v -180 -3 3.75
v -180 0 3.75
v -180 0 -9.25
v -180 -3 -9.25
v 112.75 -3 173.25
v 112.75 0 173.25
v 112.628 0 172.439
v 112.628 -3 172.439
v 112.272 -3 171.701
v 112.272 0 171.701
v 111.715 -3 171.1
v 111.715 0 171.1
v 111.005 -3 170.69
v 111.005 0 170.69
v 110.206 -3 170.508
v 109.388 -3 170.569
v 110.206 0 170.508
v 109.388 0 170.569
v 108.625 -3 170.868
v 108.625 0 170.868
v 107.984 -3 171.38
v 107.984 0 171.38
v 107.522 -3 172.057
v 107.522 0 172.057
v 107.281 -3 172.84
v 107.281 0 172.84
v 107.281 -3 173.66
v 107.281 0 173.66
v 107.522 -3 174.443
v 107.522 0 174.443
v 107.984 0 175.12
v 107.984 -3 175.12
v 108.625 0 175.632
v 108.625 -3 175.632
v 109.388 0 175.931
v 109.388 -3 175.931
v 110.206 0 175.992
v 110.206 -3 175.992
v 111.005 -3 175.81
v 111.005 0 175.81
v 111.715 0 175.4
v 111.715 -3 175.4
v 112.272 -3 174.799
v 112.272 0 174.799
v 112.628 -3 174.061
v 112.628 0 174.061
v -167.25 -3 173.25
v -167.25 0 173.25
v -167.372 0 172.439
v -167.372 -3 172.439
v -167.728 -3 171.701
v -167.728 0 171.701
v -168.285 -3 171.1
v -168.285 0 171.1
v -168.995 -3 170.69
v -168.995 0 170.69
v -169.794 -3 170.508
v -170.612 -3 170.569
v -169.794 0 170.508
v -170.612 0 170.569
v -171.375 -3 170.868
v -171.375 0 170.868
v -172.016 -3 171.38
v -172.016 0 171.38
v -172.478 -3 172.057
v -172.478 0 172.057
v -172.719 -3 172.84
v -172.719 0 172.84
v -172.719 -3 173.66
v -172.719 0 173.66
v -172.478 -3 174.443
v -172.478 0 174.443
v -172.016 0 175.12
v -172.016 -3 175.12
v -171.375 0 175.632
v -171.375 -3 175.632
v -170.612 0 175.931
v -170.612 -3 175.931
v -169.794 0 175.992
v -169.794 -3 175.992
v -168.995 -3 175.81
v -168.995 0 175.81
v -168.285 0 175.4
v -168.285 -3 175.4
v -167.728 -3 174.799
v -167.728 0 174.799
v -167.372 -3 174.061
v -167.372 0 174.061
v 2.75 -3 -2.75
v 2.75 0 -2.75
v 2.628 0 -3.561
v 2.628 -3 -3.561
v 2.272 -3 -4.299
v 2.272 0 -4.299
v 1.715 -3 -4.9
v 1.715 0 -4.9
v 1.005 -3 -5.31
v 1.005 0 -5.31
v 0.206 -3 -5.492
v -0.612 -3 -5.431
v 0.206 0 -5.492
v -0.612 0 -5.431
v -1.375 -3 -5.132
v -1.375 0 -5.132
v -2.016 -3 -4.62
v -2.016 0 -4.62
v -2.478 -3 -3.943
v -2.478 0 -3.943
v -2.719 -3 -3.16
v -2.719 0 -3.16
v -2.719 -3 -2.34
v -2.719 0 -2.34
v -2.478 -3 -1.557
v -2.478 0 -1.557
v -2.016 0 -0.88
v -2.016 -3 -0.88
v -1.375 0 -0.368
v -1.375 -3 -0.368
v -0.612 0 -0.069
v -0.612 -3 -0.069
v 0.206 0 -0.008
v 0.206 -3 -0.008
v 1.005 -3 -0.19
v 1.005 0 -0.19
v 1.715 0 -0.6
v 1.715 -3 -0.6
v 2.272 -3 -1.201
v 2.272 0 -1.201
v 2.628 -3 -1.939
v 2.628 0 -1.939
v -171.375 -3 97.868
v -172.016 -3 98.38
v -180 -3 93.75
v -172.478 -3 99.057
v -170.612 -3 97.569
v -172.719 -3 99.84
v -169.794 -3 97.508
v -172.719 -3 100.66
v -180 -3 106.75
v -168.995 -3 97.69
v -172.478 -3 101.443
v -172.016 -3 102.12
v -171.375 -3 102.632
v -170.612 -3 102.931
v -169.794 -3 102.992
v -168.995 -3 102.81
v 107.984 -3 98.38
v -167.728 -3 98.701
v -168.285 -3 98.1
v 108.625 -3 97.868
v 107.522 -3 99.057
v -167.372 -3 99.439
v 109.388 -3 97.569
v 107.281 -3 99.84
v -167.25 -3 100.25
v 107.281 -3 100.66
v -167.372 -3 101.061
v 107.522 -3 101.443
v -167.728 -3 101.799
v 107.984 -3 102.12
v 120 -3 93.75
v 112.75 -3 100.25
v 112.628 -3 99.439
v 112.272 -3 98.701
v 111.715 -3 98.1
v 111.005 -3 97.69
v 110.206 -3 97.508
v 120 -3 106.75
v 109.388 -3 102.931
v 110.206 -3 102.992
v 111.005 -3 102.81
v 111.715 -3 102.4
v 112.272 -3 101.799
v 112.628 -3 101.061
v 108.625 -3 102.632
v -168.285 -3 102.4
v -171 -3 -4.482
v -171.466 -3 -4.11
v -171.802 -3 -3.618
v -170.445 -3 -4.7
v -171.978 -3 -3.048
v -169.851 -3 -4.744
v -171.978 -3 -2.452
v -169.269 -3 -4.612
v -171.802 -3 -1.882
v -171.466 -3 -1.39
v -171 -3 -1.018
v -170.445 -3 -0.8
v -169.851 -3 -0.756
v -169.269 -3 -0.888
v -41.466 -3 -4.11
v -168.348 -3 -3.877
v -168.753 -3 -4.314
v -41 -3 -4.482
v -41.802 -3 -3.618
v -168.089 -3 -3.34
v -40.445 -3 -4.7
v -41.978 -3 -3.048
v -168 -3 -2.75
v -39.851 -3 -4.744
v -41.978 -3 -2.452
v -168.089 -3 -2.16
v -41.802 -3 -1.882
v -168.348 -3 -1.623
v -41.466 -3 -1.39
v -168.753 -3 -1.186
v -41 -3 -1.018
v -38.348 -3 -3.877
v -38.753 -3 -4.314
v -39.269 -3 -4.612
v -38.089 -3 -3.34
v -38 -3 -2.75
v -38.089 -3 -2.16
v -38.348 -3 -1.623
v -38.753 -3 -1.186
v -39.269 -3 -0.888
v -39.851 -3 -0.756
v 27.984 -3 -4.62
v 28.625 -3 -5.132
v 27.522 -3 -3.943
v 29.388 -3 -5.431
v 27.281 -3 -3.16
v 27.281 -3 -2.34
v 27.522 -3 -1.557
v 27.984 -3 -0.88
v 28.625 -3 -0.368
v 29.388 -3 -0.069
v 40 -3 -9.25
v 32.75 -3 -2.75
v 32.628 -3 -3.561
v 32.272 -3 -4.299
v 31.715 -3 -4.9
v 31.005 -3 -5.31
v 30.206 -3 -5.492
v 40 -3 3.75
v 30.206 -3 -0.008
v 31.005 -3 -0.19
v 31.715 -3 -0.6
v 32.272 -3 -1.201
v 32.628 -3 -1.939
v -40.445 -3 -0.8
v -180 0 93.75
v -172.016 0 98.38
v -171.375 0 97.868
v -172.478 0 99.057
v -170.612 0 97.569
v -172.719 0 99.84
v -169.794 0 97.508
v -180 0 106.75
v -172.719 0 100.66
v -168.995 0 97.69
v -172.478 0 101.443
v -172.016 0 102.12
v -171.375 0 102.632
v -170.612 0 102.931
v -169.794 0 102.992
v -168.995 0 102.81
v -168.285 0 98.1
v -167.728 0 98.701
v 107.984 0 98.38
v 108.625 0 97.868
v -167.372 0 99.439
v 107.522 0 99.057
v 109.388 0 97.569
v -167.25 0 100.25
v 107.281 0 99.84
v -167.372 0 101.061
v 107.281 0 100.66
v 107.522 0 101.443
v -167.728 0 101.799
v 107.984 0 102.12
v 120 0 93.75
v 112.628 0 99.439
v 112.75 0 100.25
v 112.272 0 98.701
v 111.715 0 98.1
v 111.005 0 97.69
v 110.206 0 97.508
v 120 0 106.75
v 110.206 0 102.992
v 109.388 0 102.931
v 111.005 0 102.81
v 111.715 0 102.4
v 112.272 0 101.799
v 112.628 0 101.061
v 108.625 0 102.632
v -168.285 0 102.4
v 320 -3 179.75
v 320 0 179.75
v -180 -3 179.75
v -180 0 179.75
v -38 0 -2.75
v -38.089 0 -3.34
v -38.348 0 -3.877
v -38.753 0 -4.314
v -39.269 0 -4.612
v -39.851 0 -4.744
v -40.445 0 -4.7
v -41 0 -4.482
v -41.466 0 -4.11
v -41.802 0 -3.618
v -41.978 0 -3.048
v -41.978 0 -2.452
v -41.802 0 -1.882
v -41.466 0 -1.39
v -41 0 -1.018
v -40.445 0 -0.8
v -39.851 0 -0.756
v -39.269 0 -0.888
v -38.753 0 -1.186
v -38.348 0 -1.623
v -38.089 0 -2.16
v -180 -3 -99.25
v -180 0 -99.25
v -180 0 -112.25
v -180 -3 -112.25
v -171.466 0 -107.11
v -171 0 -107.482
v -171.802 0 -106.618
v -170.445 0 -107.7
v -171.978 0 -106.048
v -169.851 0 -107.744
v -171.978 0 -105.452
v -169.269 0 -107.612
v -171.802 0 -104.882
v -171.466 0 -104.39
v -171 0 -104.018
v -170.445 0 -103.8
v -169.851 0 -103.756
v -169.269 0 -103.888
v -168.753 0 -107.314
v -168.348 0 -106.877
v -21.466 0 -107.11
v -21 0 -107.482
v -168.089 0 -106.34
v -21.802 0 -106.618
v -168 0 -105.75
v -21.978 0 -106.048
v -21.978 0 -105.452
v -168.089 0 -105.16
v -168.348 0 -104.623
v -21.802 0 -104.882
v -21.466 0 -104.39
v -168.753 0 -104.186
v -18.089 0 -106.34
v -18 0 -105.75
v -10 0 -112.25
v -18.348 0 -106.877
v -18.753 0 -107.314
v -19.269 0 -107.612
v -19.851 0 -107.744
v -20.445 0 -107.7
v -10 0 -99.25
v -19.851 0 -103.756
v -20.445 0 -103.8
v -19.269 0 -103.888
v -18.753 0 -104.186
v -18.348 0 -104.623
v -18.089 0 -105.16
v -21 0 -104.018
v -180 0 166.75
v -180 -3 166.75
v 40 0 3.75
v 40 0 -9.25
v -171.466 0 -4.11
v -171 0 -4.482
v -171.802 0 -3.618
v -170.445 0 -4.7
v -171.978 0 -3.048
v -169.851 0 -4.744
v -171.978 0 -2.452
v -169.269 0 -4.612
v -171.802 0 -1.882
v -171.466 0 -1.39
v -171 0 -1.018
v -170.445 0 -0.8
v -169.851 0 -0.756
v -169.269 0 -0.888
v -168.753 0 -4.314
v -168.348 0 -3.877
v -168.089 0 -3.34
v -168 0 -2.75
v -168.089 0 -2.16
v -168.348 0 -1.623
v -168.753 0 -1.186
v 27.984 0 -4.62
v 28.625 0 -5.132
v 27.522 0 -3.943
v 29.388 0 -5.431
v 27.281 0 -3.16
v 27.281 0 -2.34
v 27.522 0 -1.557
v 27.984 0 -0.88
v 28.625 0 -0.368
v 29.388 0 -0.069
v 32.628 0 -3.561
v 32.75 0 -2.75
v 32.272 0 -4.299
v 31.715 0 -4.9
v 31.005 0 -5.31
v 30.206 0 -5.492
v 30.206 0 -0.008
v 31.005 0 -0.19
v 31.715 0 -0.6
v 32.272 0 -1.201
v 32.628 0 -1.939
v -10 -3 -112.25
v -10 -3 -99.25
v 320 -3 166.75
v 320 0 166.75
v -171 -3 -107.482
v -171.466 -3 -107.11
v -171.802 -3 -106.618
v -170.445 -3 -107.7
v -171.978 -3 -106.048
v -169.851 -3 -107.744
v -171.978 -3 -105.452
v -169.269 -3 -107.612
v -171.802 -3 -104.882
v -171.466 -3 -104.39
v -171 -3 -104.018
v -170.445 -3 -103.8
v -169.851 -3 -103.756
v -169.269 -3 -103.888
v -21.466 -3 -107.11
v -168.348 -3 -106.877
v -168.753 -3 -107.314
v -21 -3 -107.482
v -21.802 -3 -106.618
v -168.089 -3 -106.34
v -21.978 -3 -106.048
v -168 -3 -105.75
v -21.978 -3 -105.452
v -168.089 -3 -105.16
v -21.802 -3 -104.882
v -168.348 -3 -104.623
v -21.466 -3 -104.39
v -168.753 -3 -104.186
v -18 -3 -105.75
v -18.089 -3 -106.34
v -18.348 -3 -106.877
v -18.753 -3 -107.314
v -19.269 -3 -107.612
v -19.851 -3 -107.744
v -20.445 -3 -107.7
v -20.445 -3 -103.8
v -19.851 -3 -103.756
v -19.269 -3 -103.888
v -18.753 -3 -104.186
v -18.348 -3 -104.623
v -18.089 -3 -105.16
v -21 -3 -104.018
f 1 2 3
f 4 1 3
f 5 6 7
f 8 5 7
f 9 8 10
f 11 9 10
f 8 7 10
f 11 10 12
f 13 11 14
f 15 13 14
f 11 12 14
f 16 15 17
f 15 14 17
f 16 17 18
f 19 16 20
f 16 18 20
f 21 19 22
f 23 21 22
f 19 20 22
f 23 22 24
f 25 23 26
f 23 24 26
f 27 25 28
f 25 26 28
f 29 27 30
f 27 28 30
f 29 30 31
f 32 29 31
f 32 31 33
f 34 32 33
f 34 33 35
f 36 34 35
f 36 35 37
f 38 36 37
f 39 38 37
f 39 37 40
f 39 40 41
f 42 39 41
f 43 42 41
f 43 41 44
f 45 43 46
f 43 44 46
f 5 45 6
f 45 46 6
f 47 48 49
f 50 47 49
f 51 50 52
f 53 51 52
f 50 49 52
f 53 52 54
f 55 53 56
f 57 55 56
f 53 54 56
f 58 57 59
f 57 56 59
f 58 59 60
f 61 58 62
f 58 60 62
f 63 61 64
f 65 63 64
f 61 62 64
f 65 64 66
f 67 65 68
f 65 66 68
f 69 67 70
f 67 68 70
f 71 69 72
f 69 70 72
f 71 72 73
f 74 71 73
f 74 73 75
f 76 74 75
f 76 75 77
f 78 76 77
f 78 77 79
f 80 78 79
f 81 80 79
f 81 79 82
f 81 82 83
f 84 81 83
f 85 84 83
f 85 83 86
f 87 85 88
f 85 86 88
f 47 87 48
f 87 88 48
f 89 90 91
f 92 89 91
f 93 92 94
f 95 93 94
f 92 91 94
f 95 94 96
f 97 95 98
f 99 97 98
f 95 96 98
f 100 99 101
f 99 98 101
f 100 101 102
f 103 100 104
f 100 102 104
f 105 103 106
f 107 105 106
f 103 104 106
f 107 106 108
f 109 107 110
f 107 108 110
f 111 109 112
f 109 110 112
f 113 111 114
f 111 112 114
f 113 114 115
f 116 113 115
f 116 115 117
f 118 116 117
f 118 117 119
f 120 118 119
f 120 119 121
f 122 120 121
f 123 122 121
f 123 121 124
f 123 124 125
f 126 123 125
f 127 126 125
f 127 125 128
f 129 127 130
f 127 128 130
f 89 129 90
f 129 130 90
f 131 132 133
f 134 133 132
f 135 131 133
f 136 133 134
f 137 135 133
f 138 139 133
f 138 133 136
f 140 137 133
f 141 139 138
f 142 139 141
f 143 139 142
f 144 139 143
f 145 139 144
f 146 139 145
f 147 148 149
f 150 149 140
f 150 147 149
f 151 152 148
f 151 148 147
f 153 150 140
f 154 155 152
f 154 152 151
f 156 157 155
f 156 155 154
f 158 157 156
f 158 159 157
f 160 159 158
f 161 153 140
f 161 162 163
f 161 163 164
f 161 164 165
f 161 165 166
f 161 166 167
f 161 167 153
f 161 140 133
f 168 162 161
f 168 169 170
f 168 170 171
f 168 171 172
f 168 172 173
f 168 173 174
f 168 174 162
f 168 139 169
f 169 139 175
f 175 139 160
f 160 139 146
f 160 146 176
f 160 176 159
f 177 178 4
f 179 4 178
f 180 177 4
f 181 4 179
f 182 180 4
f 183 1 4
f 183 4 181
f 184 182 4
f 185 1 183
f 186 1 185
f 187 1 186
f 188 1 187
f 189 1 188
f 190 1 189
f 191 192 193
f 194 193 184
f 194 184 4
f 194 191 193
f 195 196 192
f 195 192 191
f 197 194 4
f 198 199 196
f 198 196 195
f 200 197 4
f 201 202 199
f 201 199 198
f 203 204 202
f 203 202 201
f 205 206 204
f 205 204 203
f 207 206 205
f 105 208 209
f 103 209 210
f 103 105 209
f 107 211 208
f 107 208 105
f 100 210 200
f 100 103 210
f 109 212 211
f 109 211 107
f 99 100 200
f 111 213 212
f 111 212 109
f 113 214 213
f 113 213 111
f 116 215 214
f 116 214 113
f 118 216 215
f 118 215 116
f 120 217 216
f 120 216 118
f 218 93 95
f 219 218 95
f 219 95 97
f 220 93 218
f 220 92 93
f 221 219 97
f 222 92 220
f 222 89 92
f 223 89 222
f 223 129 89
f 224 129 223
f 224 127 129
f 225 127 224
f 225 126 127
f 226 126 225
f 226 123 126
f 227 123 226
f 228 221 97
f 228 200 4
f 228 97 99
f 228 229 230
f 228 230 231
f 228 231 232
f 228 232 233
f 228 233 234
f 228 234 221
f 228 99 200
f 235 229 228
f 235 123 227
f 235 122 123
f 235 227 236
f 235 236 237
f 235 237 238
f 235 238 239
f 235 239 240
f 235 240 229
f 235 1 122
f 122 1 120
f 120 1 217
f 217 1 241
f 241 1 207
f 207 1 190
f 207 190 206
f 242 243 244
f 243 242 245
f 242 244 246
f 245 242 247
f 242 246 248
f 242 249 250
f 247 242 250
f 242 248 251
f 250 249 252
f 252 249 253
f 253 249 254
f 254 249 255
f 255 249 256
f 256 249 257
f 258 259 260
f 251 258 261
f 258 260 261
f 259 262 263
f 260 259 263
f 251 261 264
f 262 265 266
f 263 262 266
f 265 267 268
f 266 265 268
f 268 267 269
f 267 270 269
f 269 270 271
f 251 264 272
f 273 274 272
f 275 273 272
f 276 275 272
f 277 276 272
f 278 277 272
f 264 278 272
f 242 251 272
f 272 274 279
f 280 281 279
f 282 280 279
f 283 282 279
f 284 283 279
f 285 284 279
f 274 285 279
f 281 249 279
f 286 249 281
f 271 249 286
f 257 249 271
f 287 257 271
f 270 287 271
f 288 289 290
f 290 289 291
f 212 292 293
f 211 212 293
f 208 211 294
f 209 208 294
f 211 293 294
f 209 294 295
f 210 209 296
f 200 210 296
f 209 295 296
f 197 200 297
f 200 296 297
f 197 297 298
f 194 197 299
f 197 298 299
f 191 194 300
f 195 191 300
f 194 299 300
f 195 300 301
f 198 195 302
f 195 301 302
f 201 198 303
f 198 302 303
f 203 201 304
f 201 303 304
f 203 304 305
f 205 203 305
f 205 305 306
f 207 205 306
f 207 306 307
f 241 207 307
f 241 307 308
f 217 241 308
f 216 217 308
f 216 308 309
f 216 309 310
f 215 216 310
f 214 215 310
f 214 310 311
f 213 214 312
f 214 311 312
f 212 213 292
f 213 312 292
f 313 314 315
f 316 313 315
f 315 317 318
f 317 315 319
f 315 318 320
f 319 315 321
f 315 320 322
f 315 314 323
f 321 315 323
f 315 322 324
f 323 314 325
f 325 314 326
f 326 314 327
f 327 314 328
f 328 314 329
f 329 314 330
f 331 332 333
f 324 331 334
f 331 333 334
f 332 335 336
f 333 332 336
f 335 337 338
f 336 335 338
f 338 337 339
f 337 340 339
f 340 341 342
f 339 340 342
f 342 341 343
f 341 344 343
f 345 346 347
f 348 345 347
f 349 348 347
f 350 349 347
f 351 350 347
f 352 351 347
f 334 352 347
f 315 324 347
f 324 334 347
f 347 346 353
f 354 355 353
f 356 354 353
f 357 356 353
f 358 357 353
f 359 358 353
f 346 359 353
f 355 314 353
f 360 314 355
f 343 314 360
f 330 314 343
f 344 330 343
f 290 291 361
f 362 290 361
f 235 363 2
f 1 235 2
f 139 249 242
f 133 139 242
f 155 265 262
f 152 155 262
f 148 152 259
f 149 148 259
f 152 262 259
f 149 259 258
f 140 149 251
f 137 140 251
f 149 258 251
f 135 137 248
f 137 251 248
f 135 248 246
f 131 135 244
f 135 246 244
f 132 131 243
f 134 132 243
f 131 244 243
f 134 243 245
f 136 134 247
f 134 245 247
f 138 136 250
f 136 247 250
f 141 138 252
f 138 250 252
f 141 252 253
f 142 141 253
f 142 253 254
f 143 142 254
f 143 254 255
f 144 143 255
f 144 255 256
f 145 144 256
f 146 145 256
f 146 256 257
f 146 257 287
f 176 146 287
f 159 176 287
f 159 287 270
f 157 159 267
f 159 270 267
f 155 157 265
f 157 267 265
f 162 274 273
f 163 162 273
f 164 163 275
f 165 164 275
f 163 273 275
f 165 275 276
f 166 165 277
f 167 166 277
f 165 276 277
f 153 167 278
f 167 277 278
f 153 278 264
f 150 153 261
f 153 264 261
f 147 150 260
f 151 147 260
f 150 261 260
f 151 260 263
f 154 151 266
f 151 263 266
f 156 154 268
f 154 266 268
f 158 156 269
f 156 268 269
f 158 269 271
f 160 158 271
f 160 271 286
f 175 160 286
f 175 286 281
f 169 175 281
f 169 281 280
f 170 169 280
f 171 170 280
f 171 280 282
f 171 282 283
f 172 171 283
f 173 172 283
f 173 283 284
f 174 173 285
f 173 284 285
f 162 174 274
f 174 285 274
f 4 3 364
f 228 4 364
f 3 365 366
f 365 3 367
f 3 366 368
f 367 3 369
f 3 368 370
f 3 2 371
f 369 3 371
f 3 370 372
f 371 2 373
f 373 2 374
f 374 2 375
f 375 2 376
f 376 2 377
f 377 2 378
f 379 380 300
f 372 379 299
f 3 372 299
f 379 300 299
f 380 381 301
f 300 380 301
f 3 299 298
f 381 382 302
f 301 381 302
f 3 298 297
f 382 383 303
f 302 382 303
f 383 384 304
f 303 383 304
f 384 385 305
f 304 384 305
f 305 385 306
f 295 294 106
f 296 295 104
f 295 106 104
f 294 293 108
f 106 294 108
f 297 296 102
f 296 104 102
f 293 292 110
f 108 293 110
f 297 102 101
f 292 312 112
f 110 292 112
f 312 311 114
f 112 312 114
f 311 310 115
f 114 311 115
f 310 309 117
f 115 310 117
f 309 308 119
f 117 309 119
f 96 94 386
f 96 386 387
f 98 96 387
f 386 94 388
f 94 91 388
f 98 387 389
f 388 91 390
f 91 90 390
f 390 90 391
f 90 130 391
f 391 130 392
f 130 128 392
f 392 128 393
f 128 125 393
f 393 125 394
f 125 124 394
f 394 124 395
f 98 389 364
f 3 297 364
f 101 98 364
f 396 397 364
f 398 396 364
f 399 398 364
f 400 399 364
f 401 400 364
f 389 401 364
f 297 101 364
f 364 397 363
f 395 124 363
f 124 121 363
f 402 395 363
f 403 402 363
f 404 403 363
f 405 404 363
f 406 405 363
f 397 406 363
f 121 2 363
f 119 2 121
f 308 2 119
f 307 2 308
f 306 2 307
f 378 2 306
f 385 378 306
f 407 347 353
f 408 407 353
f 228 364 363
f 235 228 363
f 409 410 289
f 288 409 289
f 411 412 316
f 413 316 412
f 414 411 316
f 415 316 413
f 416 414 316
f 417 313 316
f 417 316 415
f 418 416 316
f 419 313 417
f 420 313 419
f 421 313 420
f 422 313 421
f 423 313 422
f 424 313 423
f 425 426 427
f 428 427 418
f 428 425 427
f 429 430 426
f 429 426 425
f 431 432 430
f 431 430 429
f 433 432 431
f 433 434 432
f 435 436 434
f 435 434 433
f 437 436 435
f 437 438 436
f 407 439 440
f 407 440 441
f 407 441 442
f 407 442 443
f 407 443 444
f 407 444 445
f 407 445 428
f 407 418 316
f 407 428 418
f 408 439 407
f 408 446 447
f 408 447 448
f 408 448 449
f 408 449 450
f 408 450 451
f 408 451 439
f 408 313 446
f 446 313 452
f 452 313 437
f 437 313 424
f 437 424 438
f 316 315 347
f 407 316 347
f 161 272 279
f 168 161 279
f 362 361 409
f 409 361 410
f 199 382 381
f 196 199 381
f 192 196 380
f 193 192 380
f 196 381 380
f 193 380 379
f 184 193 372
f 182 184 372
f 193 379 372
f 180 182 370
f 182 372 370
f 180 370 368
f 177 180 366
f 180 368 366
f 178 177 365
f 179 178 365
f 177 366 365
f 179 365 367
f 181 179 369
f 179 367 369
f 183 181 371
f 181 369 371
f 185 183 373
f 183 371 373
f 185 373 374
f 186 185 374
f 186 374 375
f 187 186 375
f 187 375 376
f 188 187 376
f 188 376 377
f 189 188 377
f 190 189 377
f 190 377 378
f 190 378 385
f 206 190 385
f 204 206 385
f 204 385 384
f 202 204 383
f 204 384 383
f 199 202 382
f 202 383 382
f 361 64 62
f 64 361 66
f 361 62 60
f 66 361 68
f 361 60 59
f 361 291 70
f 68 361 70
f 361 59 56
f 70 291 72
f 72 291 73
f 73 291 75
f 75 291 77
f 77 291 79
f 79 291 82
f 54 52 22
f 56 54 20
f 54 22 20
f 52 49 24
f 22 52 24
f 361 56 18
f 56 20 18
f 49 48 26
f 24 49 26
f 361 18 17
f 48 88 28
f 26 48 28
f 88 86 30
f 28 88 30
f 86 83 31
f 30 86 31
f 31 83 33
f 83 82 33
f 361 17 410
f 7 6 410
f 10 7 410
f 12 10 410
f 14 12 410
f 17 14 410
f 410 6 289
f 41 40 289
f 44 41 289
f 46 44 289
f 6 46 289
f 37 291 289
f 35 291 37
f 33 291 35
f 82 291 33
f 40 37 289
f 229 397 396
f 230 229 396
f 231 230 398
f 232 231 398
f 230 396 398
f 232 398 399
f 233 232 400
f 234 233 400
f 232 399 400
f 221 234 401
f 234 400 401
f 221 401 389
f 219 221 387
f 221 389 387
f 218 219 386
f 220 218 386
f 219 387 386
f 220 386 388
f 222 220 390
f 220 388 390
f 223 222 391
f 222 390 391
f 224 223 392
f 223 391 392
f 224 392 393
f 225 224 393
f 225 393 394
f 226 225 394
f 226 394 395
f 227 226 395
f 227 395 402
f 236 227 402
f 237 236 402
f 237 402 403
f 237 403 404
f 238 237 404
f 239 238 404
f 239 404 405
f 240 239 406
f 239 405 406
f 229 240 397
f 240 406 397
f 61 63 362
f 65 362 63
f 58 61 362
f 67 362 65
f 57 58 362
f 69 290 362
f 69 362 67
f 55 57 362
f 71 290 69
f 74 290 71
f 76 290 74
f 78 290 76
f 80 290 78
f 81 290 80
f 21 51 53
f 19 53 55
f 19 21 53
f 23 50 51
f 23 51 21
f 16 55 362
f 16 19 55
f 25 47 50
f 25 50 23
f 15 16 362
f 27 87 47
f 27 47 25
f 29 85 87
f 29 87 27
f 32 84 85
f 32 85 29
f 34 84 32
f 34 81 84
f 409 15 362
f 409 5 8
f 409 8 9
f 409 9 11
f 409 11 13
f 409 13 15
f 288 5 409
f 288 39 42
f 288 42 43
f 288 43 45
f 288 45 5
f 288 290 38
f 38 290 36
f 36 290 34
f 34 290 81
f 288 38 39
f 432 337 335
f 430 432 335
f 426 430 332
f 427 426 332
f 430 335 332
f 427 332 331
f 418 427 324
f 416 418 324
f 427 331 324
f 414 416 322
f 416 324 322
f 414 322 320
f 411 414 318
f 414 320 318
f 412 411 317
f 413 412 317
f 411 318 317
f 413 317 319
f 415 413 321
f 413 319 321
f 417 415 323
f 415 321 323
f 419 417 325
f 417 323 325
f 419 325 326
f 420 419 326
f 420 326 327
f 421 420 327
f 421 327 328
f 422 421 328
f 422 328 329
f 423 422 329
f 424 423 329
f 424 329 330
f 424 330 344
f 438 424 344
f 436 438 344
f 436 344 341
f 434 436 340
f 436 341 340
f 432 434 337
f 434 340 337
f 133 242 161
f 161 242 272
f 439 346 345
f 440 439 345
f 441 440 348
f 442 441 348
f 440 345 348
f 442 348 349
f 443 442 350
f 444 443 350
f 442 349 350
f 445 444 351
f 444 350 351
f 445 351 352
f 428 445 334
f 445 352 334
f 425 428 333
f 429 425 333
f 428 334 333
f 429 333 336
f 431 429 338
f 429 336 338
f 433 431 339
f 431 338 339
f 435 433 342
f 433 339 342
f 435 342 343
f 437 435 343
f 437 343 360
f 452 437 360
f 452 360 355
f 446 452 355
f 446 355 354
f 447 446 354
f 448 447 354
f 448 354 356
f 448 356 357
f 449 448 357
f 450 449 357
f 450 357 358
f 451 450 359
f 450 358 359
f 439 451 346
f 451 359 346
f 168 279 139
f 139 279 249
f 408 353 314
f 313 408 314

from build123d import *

# Parameters (mm, degrees)
F1_DEPTH = 3


with BuildPart() as f1:
    # F0 (on Front) → F1 (new body)
    with BuildSketch(Plane.XZ):
        with BuildLine():
            Line((320, 179.75), (-180, 179.75))
            Line((-180, 179.75), (-180, 173.25))
            Line((-180, 173.25), (-172.75, 173.25))
            ThreePointArc((-172.75, 173.25), (-170, 176), (-167.25, 173.25))
            Line((-167.25, 173.25), (107.25, 173.25))
            ThreePointArc((107.25, 173.25), (110, 176), (112.75, 173.25))
            Line((112.75, 173.25), (320, 173.25))
            Line((320, 173.25), (320, 179.75))
        make_face()
        with BuildLine():
            Line((-172.75, 173.25), (-180, 173.25))
            Line((-180, 173.25), (-180, 166.75))
            Line((-180, 166.75), (320, 166.75))
            Line((320, 166.75), (320, 173.25))
            Line((320, 173.25), (112.75, 173.25))
            ThreePointArc((112.75, 173.25), (110, 170.5), (107.25, 173.25))
            Line((107.25, 173.25), (-167.25, 173.25))
            ThreePointArc((-167.25, 173.25), (-170, 170.5), (-172.75, 173.25))
        make_face()
        with BuildLine():
            Line((120, 106.75), (-180, 106.75))
            Line((-180, 106.75), (-180, 100.25))
            Line((-180, 100.25), (-172.75, 100.25))
            ThreePointArc((-172.75, 100.25), (-170, 103), (-167.25, 100.25))
            Line((-167.25, 100.25), (107.25, 100.25))
            ThreePointArc((107.25, 100.25), (110, 103), (112.75, 100.25))
            Line((112.75, 100.25), (120, 100.25))
            Line((120, 100.25), (120, 106.75))
        make_face()
        with BuildLine():
            Line((-172.75, 100.25), (-180, 100.25))
            Line((-180, 100.25), (-180, 93.75))
            Line((-180, 93.75), (120, 93.75))
            Line((120, 93.75), (120, 100.25))
            Line((120, 100.25), (112.75, 100.25))
            ThreePointArc((112.75, 100.25), (110, 97.5), (107.25, 100.25))
            Line((107.25, 100.25), (-167.25, 100.25))
            ThreePointArc((-167.25, 100.25), (-170, 97.5), (-172.75, 100.25))
        make_face()
        with BuildLine():
            Line((40, 3.75), (-180, 3.75))
            Line((-180, 3.75), (-180, -2.75))
            Line((-180, -2.75), (-172, -2.75))
            ThreePointArc((-172, -2.75), (-170, -0.75), (-168, -2.75))
            Line((-168, -2.75), (-42, -2.75))
            ThreePointArc((-42, -2.75), (-40, -0.75), (-38, -2.75))
            Line((-38, -2.75), (-2.75, -2.75))
            ThreePointArc((-2.75, -2.75), (0, 0), (2.75, -2.75))
            Line((2.75, -2.75), (27.25, -2.75))
            ThreePointArc((27.25, -2.75), (30, 0), (32.75, -2.75))
            Line((32.75, -2.75), (40, -2.75))
            Line((40, -2.75), (40, 3.75))
        make_face()
        with BuildLine():
            Line((-172, -2.75), (-180, -2.75))
            Line((-180, -2.75), (-180, -9.25))
            Line((-180, -9.25), (40, -9.25))
            Line((40, -9.25), (40, -2.75))
            Line((40, -2.75), (32.75, -2.75))
            ThreePointArc((32.75, -2.75), (30, -5.5), (27.25, -2.75))
            Line((27.25, -2.75), (2.75, -2.75))
            ThreePointArc((2.75, -2.75), (0, -5.5), (-2.75, -2.75))
            Line((-2.75, -2.75), (-38, -2.75))
            ThreePointArc((-38, -2.75), (-40, -4.75), (-42, -2.75))
            Line((-42, -2.75), (-168, -2.75))
            ThreePointArc((-168, -2.75), (-170, -4.75), (-172, -2.75))
        make_face()
        with BuildLine():
            Line((-10, -99.25), (-180, -99.25))
            Line((-180, -99.25), (-180, -105.75))
            Line((-180, -105.75), (-172, -105.75))
            ThreePointArc((-172, -105.75), (-170, -103.75), (-168, -105.75))
            Line((-168, -105.75), (-22, -105.75))
            ThreePointArc((-22, -105.75), (-20, -103.75), (-18, -105.75))
            Line((-18, -105.75), (-10, -105.75))
            Line((-10, -105.75), (-10, -99.25))
        make_face()
        with BuildLine():
            Line((-172, -105.75), (-180, -105.75))
            Line((-180, -105.75), (-180, -112.25))
            Line((-180, -112.25), (-10, -112.25))
            Line((-10, -112.25), (-10, -105.75))
            Line((-10, -105.75), (-18, -105.75))
            ThreePointArc((-18, -105.75), (-20, -107.75), (-22, -105.75))
            Line((-22, -105.75), (-168, -105.75))
            ThreePointArc((-168, -105.75), (-170, -107.75), (-172, -105.75))
        make_face()
    extrude(amount=F1_DEPTH)


solid = f1.part
